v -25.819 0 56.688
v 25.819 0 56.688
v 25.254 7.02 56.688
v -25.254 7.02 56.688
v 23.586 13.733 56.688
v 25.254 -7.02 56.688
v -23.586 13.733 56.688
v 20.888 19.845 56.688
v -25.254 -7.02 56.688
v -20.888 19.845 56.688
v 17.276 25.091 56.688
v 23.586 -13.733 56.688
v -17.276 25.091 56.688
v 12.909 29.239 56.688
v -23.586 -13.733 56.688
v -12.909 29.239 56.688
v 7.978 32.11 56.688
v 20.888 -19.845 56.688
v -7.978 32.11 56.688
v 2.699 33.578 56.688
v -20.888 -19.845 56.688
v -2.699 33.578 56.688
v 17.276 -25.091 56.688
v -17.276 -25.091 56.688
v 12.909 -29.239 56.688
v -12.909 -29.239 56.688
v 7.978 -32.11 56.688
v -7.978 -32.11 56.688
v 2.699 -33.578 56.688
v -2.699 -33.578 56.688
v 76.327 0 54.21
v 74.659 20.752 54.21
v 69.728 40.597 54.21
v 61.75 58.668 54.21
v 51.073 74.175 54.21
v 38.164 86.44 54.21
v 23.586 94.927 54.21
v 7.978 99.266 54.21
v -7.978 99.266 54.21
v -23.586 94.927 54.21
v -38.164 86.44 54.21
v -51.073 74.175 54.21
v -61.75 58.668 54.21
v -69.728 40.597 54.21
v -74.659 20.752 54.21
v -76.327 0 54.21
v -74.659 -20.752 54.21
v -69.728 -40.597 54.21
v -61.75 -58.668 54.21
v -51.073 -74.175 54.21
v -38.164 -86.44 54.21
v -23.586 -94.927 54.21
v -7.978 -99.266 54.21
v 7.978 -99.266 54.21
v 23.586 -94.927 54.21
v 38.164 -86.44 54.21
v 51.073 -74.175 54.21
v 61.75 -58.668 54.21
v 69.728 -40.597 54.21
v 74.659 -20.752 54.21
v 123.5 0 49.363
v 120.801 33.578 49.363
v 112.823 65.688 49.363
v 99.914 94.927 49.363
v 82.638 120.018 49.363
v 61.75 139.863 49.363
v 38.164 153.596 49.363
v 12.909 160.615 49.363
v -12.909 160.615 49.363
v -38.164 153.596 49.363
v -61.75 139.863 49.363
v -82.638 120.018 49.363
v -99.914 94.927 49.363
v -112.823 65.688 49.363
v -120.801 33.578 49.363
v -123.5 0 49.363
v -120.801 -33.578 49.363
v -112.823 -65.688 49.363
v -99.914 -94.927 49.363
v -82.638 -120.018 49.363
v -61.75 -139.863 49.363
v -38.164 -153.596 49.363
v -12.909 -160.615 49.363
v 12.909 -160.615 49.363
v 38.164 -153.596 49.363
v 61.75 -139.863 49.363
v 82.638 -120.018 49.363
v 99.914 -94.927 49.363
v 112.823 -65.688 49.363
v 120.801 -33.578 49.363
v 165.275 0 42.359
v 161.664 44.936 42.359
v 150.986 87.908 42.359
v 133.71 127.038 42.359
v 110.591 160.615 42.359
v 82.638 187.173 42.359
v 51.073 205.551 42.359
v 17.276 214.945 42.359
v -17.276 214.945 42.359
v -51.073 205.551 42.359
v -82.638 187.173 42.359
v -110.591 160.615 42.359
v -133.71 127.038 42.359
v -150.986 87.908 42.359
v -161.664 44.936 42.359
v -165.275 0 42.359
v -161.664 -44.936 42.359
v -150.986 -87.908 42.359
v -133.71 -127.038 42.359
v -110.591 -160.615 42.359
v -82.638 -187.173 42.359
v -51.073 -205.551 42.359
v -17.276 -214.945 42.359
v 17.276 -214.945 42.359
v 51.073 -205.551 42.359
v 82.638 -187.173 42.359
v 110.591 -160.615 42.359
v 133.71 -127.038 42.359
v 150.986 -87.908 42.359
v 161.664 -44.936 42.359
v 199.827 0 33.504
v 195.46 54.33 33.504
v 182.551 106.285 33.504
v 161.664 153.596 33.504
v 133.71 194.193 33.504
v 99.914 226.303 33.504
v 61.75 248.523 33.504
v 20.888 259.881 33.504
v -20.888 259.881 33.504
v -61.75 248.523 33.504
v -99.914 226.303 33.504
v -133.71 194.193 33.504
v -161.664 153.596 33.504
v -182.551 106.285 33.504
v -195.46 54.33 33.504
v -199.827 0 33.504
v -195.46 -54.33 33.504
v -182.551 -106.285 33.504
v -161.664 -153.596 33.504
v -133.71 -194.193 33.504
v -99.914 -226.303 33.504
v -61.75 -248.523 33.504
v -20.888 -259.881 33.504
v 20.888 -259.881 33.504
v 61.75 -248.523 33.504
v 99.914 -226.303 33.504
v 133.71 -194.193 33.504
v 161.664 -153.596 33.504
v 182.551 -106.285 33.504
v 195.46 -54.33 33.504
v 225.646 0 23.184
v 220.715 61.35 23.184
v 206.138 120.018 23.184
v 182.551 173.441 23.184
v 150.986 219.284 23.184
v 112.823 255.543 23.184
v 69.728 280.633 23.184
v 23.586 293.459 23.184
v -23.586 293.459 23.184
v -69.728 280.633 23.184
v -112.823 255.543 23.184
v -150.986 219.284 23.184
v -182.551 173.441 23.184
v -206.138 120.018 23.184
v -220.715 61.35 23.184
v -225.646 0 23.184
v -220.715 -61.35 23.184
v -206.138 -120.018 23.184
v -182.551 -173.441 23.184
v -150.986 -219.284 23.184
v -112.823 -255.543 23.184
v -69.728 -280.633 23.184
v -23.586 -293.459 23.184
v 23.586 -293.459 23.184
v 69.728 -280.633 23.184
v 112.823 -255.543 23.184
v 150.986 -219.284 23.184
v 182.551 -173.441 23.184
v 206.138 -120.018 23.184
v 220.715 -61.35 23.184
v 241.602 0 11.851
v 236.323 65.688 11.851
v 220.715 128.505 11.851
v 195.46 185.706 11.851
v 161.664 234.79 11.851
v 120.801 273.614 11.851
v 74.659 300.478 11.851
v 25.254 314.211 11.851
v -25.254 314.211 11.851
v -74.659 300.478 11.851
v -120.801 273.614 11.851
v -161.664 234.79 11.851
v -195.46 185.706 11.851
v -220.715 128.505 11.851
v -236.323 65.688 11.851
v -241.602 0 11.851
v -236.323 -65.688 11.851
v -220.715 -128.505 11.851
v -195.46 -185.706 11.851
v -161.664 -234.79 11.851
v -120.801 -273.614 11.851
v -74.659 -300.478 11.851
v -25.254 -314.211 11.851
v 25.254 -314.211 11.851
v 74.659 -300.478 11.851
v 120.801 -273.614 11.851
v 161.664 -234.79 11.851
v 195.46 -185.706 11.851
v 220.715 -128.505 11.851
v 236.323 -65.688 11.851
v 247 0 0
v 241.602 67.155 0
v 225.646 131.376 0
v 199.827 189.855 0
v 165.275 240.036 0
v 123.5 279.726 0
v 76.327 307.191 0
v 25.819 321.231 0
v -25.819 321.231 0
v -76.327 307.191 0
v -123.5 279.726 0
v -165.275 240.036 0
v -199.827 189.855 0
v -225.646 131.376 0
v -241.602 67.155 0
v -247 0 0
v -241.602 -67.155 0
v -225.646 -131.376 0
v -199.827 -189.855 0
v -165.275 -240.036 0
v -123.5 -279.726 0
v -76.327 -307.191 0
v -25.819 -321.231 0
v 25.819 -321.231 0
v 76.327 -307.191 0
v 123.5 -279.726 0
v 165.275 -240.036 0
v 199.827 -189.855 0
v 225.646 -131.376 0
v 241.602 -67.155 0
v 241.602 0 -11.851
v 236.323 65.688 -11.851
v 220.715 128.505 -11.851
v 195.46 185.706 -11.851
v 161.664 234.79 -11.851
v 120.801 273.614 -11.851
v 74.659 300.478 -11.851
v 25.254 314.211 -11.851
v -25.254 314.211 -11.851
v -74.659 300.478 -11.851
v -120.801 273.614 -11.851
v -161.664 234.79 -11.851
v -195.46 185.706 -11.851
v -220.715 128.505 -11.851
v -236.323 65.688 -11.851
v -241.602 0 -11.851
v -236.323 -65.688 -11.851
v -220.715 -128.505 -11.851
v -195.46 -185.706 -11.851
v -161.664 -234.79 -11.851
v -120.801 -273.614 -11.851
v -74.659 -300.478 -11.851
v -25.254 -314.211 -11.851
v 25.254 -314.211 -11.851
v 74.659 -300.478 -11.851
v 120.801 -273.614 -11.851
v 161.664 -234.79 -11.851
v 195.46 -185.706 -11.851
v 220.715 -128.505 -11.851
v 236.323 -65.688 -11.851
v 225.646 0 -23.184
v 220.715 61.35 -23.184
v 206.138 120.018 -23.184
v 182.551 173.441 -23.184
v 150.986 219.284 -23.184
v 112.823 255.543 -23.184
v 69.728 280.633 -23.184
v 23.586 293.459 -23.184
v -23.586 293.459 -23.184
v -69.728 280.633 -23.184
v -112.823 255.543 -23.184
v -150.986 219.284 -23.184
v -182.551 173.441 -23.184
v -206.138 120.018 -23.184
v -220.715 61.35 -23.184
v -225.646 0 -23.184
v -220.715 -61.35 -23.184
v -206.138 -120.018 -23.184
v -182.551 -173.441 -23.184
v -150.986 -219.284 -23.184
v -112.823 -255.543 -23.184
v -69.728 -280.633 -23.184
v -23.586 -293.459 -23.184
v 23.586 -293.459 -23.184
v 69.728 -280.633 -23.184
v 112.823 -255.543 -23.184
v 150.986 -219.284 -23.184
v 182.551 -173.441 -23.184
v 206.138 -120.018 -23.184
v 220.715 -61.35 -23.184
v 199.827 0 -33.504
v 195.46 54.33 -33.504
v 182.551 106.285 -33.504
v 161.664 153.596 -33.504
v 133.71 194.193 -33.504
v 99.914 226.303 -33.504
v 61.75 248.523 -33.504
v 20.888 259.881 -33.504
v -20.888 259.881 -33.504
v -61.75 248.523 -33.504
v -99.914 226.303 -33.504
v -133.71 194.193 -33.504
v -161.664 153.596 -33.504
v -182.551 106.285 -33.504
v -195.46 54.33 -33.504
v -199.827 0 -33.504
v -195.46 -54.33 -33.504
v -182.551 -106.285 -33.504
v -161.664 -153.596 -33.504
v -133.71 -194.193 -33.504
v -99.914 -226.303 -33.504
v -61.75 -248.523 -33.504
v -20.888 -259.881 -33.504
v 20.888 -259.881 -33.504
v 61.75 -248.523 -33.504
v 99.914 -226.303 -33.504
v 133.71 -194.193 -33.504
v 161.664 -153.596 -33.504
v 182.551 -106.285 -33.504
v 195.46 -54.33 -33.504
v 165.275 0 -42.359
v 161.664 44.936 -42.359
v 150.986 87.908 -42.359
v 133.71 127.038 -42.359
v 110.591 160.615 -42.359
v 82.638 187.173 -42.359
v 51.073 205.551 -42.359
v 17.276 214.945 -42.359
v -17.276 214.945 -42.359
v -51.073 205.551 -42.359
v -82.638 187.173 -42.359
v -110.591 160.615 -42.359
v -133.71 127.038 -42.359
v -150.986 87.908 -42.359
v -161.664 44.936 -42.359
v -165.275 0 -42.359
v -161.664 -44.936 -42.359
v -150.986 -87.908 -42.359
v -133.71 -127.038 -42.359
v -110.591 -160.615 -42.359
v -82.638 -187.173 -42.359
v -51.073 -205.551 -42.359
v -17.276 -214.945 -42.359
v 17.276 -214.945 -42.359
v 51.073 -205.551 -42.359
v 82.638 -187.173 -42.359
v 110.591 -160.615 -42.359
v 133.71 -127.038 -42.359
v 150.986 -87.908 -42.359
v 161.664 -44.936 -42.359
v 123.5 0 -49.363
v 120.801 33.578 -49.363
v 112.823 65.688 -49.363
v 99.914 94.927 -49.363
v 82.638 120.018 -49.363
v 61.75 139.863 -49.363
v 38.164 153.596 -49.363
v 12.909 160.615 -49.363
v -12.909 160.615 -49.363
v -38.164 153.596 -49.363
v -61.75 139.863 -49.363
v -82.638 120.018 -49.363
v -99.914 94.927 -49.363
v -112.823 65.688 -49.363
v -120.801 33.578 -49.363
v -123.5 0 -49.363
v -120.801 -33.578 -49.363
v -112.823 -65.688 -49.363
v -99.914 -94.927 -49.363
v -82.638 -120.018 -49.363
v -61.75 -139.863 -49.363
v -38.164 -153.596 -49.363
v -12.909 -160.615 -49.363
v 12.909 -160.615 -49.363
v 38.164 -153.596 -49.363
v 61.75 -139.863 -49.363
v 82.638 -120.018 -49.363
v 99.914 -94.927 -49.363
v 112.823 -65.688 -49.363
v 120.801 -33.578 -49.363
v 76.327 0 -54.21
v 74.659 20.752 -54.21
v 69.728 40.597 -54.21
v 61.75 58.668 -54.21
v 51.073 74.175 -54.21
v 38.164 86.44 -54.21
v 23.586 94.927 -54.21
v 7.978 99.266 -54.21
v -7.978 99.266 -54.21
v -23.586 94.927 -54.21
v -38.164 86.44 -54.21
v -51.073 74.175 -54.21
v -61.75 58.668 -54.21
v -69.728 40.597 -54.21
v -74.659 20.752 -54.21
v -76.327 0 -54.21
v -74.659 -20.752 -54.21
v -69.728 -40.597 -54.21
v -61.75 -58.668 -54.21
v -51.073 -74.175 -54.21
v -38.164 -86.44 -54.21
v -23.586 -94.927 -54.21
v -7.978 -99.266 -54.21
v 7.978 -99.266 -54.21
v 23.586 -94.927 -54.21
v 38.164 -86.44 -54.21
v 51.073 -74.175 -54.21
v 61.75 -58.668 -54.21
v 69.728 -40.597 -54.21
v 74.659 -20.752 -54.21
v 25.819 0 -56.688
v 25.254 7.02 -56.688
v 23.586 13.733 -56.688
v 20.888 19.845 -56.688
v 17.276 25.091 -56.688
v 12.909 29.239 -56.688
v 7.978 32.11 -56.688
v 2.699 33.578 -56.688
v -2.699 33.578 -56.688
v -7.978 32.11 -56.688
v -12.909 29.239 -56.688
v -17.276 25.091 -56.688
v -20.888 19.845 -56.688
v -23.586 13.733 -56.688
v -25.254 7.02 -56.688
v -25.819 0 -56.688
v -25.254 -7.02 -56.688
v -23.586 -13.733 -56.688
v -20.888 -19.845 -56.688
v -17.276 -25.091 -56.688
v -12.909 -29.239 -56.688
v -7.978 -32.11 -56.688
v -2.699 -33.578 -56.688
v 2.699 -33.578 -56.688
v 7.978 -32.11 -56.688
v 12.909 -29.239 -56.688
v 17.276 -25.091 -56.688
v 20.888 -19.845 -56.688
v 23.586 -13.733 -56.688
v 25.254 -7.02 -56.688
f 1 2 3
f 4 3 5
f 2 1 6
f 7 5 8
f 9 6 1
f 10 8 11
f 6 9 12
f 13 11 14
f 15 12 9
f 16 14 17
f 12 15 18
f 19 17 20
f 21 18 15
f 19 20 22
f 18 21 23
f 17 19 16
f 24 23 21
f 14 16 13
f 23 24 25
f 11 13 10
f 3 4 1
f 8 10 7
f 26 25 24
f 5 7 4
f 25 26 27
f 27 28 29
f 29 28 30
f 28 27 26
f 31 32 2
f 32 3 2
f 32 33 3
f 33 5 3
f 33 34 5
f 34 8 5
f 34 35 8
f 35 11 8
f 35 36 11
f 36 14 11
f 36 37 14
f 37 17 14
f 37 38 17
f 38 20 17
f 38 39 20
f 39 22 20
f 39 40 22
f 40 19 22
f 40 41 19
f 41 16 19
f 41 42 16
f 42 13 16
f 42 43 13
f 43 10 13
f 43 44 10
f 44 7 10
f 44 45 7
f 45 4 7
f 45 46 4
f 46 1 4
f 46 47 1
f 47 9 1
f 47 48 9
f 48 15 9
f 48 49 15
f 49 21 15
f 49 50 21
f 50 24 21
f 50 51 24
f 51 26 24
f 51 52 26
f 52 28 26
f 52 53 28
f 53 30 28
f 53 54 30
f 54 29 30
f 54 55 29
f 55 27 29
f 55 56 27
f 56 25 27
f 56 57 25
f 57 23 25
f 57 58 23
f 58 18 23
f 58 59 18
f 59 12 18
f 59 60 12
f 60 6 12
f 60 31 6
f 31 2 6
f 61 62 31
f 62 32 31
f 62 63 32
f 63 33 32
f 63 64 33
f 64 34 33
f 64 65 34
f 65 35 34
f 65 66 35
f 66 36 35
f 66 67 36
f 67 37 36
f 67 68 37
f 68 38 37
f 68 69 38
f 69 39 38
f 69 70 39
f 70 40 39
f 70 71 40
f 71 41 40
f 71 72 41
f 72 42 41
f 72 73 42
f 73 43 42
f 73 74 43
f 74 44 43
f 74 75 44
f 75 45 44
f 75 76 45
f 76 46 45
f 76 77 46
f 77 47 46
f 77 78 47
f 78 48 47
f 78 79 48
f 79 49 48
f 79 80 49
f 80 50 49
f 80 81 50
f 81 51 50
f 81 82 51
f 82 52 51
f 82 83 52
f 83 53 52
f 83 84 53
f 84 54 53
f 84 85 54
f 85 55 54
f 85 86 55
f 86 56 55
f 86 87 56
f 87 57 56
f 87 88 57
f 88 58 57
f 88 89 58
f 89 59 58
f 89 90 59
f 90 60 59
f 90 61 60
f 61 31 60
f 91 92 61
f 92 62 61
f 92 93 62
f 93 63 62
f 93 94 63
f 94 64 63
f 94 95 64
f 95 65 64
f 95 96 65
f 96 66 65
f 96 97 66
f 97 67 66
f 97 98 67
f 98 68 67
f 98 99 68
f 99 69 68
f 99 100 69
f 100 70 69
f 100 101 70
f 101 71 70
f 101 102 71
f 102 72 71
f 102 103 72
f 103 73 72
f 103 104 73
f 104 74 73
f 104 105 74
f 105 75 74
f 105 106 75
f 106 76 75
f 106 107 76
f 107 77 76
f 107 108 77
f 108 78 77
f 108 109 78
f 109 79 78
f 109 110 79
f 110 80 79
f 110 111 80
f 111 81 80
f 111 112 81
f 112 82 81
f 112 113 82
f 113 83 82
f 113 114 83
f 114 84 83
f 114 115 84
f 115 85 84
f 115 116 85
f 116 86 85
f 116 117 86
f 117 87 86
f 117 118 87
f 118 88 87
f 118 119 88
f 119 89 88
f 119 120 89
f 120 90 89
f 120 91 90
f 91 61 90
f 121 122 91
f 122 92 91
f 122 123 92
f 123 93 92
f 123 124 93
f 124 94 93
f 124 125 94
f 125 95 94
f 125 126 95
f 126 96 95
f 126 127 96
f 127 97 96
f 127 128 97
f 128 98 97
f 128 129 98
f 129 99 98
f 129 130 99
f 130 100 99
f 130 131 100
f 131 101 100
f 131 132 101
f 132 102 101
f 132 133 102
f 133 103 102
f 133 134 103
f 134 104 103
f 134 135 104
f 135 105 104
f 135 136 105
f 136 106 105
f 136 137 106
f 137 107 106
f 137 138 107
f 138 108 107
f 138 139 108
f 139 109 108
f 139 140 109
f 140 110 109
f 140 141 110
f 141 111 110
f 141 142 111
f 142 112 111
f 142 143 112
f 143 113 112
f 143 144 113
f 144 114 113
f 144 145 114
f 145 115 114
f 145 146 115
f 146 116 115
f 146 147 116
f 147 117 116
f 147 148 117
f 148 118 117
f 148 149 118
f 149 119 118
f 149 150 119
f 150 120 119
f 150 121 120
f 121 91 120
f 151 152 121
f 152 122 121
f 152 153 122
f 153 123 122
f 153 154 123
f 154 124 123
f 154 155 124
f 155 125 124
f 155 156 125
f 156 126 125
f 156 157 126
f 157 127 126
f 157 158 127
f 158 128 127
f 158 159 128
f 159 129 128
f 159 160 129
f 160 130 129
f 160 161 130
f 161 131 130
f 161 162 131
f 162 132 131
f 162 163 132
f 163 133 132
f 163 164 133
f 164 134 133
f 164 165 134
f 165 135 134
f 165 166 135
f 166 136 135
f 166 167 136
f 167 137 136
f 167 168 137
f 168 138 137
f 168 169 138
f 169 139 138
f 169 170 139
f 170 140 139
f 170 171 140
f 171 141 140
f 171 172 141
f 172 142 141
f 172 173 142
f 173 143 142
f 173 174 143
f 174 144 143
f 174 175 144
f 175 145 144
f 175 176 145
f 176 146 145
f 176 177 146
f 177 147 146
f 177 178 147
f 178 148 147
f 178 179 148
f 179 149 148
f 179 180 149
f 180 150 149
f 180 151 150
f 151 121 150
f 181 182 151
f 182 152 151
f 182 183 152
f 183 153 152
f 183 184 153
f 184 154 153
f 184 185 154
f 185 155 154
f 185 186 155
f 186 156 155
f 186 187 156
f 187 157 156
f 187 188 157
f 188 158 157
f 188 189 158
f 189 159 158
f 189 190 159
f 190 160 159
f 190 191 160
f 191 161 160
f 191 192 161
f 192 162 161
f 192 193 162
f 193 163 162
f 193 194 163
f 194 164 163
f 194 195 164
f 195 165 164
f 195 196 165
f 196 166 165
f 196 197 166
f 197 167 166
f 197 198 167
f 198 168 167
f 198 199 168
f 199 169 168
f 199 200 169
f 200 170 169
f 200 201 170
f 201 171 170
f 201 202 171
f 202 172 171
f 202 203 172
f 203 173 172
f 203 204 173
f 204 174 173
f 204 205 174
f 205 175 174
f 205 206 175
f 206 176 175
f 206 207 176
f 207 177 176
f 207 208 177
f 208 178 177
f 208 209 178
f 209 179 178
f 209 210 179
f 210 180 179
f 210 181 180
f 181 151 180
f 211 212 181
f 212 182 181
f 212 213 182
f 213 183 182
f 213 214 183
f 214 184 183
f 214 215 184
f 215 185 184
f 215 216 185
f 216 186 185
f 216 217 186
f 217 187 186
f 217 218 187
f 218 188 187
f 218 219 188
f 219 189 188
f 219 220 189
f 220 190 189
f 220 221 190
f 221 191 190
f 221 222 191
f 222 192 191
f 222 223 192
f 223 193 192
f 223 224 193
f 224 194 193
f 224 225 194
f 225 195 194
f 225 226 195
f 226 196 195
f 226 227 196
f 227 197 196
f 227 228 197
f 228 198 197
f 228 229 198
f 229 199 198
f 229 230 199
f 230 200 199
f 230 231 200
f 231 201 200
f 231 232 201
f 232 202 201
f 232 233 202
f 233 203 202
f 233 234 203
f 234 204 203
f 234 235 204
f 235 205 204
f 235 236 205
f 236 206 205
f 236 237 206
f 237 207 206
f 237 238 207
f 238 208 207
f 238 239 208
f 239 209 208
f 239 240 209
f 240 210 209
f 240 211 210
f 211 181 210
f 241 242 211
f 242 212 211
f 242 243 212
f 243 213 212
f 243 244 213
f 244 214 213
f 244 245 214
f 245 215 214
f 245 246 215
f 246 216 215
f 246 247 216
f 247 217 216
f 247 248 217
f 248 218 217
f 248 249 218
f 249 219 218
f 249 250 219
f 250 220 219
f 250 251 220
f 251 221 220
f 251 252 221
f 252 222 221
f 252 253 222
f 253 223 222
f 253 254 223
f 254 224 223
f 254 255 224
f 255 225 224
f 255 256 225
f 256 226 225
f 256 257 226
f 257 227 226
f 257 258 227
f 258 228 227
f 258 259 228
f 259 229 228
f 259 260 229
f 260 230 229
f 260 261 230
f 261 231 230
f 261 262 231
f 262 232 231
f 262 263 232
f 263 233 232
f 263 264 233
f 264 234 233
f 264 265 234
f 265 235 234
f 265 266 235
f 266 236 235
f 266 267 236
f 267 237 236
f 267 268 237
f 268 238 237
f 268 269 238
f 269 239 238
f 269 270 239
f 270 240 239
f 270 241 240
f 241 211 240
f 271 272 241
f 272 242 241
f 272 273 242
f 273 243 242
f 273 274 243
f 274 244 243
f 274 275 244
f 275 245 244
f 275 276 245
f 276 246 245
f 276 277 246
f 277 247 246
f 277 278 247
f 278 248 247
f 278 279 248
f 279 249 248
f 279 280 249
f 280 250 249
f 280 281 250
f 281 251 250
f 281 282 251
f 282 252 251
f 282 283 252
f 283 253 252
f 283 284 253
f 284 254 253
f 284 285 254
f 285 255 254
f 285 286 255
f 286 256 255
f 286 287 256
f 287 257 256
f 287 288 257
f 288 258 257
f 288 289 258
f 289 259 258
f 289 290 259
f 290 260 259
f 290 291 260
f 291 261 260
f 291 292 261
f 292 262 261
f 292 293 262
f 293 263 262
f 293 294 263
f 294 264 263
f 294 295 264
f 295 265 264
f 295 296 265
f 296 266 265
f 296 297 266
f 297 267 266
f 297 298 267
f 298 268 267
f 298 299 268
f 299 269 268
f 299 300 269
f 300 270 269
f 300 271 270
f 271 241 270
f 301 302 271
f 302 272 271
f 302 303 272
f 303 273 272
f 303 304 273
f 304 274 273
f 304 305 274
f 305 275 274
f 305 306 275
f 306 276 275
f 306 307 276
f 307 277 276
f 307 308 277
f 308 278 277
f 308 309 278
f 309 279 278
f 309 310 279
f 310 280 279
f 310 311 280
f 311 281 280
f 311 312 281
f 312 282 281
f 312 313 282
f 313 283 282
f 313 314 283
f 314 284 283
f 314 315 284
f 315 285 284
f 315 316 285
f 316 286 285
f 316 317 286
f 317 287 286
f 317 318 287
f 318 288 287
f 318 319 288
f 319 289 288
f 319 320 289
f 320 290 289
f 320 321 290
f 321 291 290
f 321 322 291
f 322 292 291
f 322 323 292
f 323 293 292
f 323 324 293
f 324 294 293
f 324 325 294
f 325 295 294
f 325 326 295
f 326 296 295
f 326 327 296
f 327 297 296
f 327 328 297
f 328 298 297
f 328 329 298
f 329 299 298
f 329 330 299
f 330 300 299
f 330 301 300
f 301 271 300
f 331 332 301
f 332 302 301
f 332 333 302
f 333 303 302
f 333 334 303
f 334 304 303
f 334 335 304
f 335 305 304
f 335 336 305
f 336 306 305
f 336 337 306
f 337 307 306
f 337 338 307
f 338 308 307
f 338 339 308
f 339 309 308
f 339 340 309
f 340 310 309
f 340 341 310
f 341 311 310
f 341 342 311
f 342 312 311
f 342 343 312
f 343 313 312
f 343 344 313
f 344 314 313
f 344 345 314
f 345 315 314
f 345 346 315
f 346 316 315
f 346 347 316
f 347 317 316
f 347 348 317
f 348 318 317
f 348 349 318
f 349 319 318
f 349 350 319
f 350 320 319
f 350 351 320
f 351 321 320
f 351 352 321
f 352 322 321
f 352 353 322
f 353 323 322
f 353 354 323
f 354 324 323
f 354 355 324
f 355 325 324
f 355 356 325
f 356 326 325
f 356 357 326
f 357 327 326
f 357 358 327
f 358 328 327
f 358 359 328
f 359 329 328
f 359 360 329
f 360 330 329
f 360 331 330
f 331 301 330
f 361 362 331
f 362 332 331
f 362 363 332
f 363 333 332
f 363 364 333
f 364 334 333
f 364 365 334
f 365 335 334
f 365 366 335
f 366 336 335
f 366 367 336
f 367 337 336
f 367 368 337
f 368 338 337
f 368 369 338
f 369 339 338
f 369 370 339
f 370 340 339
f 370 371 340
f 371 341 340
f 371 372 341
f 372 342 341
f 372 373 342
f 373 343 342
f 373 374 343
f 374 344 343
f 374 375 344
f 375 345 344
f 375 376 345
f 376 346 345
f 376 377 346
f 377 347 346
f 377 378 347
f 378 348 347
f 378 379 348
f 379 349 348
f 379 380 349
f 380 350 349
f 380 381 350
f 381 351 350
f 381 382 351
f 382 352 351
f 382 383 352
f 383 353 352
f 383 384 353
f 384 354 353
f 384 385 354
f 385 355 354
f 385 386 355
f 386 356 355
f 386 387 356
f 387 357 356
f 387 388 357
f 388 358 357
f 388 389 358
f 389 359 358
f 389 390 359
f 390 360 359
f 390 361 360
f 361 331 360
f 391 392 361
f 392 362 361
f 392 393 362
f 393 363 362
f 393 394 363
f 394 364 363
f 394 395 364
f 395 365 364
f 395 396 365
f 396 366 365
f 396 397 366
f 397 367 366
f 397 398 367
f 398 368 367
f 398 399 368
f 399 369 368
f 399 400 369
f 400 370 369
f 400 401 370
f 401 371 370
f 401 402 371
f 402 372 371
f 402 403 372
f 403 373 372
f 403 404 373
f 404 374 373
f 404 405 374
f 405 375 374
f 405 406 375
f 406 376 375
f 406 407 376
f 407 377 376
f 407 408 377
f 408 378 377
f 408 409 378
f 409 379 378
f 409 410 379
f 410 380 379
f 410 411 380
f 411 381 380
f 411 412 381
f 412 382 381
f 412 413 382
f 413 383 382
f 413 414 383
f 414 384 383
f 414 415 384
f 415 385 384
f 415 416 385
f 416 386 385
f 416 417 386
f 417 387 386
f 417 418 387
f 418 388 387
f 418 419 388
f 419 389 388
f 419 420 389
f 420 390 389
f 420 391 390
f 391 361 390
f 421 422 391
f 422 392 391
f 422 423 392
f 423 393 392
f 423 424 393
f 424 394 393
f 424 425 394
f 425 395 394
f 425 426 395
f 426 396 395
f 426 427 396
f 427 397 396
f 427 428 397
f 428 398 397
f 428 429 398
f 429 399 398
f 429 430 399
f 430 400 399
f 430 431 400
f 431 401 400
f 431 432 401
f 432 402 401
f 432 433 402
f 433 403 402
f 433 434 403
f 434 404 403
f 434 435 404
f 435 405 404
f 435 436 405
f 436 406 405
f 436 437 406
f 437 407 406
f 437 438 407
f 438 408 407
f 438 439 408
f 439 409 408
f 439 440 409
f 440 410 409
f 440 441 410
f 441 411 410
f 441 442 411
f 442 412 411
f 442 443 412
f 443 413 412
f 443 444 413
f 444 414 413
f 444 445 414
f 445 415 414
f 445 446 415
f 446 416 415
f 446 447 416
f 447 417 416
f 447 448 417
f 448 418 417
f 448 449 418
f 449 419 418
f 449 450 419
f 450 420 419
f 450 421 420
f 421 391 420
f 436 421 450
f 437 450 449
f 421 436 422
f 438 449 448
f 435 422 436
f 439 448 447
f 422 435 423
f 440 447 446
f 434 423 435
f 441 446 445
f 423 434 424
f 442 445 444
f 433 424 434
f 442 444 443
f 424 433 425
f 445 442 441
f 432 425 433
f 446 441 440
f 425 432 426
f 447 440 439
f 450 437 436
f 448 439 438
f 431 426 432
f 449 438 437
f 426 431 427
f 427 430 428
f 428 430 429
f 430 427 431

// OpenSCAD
// Generated by SolidPython 1.0.1 on 2020-07-29 00:46:51


scale(v = [13, 17, 3]) {
	sphere(r = 19);
}
/***********************************************
*********      SolidPython code:      **********
************************************************
 
# import packages: SolidPython
from solid import *
from solid.utils import *
from itertools import chain, combinations, permutations


class Resize:

    def __init__(self, scad_file):
        self.scad_file = scad_file
        #self.scad_file = import_scad(scad_file)
        # cone/cylinder param:
        self.r1 = 0
        self.r2 = 0
        self.h = 0
        # rectangular prism param:
        self.w = 0
        self.l = 0
        # ellipse param:
        self.r = 0

    # import OpenScad code (file name corresponds to shape)


    # classify shape + parameters
    def assign(self, param1, param2, param3):
        if self.scad_file == 'cone.scad':
            self.r1 = param1
            self.r2 = param2
            self.h = param3
        elif self.scad_file == 'cylinder.scad':
            self.r1 = param1
            self.r2 = param2
            self.h = param3
        elif self.scad_file == 'rectangularPrism.scad':
            self.h = param1
            self.l = param2
            self.w = param3
        else:
            self.r = param1
            self.h = param2

    # resize parameters
    def iterate(self):
        x = range(3, 20, 2)
        i = 1
        if self.scad_file == 'cone.scad':
            tempList = list(permutations(x, 2))
            for temp in tempList:
                param1 = temp[0]
                param2 = temp[1]
                filepath = 'produced_scad_files/' + 'cone' + str(param1) + '_' + str(param2) + '_' + '.scad'
                scad_render_to_file(cylinder(h=param1, r1=param2, r2=0), filepath)

        elif self.scad_file == 'cylinder.scad':
            tempList = list(permutations(x, 3))
            for temp in tempList:
                param1 = temp[0]
                param2 = temp[1]
                filepath = 'produced_scad_files/' + 'cylinder' + str(param1) + '_' + str(param2) + '_' + '.scad'
                scad_render_to_file(cylinder(h=param1, r1=param2, r2=param2), filepath)

        elif self.scad_file == 'rectangularPrism.scad':
            tempList = list(permutations(x, 3))
            for temp in tempList:
                param1 = temp[0]
                param2 = temp[1]
                param3 = temp[2]
                filepath = 'produced_scad_files/' + 'rectangularPrism' + str(param1) + '_' + str(param2) + '_' + str(
                    param3) + '.scad'
                scad_render_to_file(cube(size=(param1, param2, param3)), filepath)

        elif self.scad_file == 'ellipse.scad':
            tempList = list(permutations(x, 4))
            for temp in tempList:
                param1 = temp[0]
                param2 = temp[1]
                param3 = temp[2]
                param4 = temp[3]
                filepath = 'produced_scad_files/' + 'ellipse' + str(param1) + '_' + str(param2) + '_' + str(param3) + '_' + str(param4) + '.scad'
                scad_render_to_file(scale([param1, param2, param3])(sphere(r=param4)), filepath)

    def render_to_scadfile(self):
        scad_render_to_file(scad, 'example.scad') 
 
************************************************/
